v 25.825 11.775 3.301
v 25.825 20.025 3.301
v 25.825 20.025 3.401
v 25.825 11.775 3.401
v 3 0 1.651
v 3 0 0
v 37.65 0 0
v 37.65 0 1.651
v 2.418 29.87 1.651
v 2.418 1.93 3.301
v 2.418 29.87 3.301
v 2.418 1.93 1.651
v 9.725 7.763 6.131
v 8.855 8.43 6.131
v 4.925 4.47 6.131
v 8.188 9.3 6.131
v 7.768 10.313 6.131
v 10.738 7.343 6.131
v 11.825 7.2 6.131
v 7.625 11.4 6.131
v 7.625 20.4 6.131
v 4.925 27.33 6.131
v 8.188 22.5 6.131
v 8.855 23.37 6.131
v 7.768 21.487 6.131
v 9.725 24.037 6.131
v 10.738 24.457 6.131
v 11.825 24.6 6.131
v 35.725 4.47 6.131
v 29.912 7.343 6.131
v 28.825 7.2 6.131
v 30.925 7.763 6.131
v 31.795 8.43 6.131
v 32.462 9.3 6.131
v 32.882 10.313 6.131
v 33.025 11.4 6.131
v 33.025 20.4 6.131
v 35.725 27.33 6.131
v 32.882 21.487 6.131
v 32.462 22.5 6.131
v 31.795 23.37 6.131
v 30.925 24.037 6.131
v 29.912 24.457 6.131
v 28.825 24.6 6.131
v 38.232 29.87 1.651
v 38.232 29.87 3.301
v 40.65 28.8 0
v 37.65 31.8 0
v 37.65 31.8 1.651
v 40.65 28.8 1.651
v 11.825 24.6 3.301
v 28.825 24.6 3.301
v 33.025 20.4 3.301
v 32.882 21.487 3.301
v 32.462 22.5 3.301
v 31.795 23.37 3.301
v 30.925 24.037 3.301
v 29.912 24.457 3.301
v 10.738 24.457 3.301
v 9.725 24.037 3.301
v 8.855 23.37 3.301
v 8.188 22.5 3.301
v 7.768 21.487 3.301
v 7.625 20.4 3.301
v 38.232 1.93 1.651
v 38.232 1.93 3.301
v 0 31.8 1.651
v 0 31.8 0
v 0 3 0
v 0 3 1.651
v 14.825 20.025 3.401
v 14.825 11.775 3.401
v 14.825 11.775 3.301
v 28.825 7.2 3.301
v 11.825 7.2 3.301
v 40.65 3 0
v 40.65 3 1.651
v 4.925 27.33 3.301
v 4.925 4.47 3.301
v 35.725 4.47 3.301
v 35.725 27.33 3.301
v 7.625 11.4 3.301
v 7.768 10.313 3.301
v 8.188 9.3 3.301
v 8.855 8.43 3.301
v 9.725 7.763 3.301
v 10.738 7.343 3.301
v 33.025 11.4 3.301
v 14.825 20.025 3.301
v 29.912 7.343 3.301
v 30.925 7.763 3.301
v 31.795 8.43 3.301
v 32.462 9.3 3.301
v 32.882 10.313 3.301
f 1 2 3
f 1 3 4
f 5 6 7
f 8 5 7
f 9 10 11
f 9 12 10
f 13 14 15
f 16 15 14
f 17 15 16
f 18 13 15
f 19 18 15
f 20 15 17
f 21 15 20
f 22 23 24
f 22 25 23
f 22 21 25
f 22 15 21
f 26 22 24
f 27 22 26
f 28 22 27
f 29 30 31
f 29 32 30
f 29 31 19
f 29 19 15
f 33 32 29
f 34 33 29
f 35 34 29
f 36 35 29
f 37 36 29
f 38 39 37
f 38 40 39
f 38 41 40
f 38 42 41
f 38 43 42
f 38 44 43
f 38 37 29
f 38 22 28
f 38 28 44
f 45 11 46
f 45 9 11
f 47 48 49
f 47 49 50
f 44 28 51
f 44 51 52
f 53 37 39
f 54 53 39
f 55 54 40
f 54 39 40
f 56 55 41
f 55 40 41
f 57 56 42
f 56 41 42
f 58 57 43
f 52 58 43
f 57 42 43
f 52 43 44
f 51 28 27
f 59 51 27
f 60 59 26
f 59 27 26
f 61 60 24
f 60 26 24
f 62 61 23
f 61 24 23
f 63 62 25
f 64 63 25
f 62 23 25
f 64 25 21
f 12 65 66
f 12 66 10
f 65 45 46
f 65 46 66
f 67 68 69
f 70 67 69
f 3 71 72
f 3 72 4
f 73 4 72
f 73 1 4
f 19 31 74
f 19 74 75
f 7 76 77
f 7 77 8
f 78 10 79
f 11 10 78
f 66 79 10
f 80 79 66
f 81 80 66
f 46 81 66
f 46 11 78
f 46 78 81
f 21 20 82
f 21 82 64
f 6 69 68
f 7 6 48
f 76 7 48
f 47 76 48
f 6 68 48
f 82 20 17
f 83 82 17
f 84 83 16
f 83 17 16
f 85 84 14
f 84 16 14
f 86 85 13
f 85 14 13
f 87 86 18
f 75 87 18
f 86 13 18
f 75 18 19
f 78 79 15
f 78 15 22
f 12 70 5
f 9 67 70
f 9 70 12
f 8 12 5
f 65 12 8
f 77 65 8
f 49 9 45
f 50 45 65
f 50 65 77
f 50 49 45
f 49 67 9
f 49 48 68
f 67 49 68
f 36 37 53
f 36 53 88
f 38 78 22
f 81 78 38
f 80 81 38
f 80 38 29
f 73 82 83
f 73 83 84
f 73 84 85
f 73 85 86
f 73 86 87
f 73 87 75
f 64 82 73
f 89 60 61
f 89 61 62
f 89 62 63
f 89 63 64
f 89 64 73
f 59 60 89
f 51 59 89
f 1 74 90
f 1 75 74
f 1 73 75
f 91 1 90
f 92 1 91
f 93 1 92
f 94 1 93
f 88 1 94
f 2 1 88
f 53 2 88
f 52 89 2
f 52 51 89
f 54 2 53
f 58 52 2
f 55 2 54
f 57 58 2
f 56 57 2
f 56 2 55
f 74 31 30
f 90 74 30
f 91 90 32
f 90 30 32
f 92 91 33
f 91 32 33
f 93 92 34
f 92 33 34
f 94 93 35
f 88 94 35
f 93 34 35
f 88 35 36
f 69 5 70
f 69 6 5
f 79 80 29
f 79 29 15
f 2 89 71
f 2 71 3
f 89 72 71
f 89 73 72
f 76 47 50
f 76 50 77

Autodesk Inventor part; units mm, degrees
ref_plane "YZ Plane" through (0, 0, 0) normal (1, 0, 0) x (0, 1, 0)
ref_plane "XZ Plane" through (0, 0, 0) normal (0, 1, 0) x (-1, 0, 0)
ref_plane "XY Plane" through (0, 0, 0) normal (0, 0, 1) x (1, 0, 0)
sketch "Sketch1" plane through (0, 0, 0) normal (0, 0, 1) x (1, 0, 0)
  line L0 (3, 0) -> (40.64, 0)
  line L1 (37.65, 31.8) -> (0, 31.8)
  line L2 (0, 31.8) -> (0, 3)
  line L3 (37.65, 31.8) -> (40.65, 28.8)
  line L4 (3, 0) -> (0, 3)
  line L5 (40.65, 3) -> (37.65, 0)
  line L6 (40.65, 28.8) -> (40.65, 3)
  point P0 (0, 0)
  dimension "d4" = 3
  dimension "d5" = 45
  dimension "d6" = 45
  dimension "d7" = 3
  dimension "d8" = 31.8
  dimension "d9" = 40.65
  dimension "d10" = 3
extrude "Extrusion1" add sketch "Sketch1" along normal blind 1.651
sketch "Sketch2" plane through (0, 0, 1.651) normal (0, 0, 1) x (1, 0, 0)
  line L0 (2.418, 29.87) -> (38.232, 29.87)
  line L1 (38.232, 29.87) -> (38.232, 1.93)
  line L2 (38.232, 1.93) -> (2.418, 1.93)
  line L3 (2.418, 1.93) -> (2.418, 29.87)
  line L4 (0, 31.8) -> (0, 3) projected
  line L5 (3, 0) -> (37.65, 0) projected
  line L6 (40.65, 3) -> (40.65, 28.8) projected
  point P0 (0, 0)
  point P1 (0, 17.4)
  point P2 (20.325, 1.93)
  point P3 (20.325, 0)
  point P4 (38.232, 15.9)
  point P5 (40.65, 15.9)
  dimension "d13" = 27.94
  dimension "d14" = 35.814
extrude "Extrusion2" add sketch "Sketch2" along normal blind 1.65
sketch "Sketch3" plane through (0, 0, 3.301) normal (0, 0, 1) x (1, 0, 0)
  line L0 (4.925, 27.33) -> (35.725, 27.33)
  line L1 (35.725, 27.33) -> (35.725, 4.47)
  line L2 (35.725, 4.47) -> (4.925, 4.47)
  line L3 (4.925, 4.47) -> (4.925, 27.33)
  line L4 (2.418, 29.87) -> (2.418, 1.93) projected
  line L5 (3, 0) -> (37.65, 0) projected
  point P0 (0, 0)
  point P1 (4.925, 15.9)
  point P2 (2.418, 15.9)
  point P3 (20.325, 4.47)
  point P4 (20.325, 0)
  dimension "d17" = 22.86
  dimension "d18" = 30.8
extrude "Extrusion3" add sketch "Sketch3" along normal blind 2.83
sketch "Sketch4" plane through (0, 0, 6.131) normal (0, 0, 1) x (1, 0, 0)
  line L0 (11.825, 24.6) -> (28.825, 24.6)
  line L1 (33.025, 20.4) -> (33.025, 11.4)
  line L2 (28.825, 7.2) -> (11.825, 7.2)
  line L3 (7.625, 11.4) -> (7.625, 20.4)
  line L4 (4.925, 27.33) -> (4.925, 4.47) projected
  line L5 (2.418, 1.93) -> (38.232, 1.93) projected
  arc A0 (7.625, 11.4) -> (11.825, 7.2) centre (11.825, 11.4) ccw
  arc A1 (11.825, 24.6) -> (7.625, 20.4) centre (11.825, 20.4) ccw
  arc A2 (33.025, 20.4) -> (28.825, 24.6) centre (28.825, 20.4) ccw
  arc A3 (28.825, 7.2) -> (33.025, 11.4) centre (28.825, 11.4) ccw
  point P0 (0, 0)
  point P1 (7.625, 24.6)
  point P2 (33.025, 7.2)
  point P3 (7.625, 7.2)
  point P4 (7.625, 15.9)
  point P5 (4.925, 15.9)
  point P6 (20.325, 7.2)
  point P7 (20.325, 1.93)
  dimension "d21" = 17.4
  dimension "d22" = 25.4
  dimension "d23" = 4.2
extrude "Extrusion4" cut sketch "Sketch4" against normal blind 2.83
sketch "Sketch5" plane through (0, 0, 3.301) normal (0, 0, 1) x (1, 0, 0)
  line L0 (25.825, 11.775) -> (14.825, 11.775)
  line L1 (14.825, 11.775) -> (14.825, 20.025)
  line L2 (14.825, 20.025) -> (25.825, 20.025)
  line L3 (25.825, 20.025) -> (25.825, 11.775)
  line L4 (7.625, 11.4) -> (7.625, 20.4) projected
  line L5 (28.825, 7.2) -> (11.825, 7.2) projected
  point P0 (0, 0)
  point P1 (14.825, 15.9)
  point P2 (7.625, 15.9)
  point P3 (20.325, 11.775)
  point P4 (20.325, 7.2)
  dimension "d26" = 11
  dimension "d27" = 8.25
extrude "Extrusion5" add sketch "Sketch5" along normal blind 0.1
properties part number "DLP"
